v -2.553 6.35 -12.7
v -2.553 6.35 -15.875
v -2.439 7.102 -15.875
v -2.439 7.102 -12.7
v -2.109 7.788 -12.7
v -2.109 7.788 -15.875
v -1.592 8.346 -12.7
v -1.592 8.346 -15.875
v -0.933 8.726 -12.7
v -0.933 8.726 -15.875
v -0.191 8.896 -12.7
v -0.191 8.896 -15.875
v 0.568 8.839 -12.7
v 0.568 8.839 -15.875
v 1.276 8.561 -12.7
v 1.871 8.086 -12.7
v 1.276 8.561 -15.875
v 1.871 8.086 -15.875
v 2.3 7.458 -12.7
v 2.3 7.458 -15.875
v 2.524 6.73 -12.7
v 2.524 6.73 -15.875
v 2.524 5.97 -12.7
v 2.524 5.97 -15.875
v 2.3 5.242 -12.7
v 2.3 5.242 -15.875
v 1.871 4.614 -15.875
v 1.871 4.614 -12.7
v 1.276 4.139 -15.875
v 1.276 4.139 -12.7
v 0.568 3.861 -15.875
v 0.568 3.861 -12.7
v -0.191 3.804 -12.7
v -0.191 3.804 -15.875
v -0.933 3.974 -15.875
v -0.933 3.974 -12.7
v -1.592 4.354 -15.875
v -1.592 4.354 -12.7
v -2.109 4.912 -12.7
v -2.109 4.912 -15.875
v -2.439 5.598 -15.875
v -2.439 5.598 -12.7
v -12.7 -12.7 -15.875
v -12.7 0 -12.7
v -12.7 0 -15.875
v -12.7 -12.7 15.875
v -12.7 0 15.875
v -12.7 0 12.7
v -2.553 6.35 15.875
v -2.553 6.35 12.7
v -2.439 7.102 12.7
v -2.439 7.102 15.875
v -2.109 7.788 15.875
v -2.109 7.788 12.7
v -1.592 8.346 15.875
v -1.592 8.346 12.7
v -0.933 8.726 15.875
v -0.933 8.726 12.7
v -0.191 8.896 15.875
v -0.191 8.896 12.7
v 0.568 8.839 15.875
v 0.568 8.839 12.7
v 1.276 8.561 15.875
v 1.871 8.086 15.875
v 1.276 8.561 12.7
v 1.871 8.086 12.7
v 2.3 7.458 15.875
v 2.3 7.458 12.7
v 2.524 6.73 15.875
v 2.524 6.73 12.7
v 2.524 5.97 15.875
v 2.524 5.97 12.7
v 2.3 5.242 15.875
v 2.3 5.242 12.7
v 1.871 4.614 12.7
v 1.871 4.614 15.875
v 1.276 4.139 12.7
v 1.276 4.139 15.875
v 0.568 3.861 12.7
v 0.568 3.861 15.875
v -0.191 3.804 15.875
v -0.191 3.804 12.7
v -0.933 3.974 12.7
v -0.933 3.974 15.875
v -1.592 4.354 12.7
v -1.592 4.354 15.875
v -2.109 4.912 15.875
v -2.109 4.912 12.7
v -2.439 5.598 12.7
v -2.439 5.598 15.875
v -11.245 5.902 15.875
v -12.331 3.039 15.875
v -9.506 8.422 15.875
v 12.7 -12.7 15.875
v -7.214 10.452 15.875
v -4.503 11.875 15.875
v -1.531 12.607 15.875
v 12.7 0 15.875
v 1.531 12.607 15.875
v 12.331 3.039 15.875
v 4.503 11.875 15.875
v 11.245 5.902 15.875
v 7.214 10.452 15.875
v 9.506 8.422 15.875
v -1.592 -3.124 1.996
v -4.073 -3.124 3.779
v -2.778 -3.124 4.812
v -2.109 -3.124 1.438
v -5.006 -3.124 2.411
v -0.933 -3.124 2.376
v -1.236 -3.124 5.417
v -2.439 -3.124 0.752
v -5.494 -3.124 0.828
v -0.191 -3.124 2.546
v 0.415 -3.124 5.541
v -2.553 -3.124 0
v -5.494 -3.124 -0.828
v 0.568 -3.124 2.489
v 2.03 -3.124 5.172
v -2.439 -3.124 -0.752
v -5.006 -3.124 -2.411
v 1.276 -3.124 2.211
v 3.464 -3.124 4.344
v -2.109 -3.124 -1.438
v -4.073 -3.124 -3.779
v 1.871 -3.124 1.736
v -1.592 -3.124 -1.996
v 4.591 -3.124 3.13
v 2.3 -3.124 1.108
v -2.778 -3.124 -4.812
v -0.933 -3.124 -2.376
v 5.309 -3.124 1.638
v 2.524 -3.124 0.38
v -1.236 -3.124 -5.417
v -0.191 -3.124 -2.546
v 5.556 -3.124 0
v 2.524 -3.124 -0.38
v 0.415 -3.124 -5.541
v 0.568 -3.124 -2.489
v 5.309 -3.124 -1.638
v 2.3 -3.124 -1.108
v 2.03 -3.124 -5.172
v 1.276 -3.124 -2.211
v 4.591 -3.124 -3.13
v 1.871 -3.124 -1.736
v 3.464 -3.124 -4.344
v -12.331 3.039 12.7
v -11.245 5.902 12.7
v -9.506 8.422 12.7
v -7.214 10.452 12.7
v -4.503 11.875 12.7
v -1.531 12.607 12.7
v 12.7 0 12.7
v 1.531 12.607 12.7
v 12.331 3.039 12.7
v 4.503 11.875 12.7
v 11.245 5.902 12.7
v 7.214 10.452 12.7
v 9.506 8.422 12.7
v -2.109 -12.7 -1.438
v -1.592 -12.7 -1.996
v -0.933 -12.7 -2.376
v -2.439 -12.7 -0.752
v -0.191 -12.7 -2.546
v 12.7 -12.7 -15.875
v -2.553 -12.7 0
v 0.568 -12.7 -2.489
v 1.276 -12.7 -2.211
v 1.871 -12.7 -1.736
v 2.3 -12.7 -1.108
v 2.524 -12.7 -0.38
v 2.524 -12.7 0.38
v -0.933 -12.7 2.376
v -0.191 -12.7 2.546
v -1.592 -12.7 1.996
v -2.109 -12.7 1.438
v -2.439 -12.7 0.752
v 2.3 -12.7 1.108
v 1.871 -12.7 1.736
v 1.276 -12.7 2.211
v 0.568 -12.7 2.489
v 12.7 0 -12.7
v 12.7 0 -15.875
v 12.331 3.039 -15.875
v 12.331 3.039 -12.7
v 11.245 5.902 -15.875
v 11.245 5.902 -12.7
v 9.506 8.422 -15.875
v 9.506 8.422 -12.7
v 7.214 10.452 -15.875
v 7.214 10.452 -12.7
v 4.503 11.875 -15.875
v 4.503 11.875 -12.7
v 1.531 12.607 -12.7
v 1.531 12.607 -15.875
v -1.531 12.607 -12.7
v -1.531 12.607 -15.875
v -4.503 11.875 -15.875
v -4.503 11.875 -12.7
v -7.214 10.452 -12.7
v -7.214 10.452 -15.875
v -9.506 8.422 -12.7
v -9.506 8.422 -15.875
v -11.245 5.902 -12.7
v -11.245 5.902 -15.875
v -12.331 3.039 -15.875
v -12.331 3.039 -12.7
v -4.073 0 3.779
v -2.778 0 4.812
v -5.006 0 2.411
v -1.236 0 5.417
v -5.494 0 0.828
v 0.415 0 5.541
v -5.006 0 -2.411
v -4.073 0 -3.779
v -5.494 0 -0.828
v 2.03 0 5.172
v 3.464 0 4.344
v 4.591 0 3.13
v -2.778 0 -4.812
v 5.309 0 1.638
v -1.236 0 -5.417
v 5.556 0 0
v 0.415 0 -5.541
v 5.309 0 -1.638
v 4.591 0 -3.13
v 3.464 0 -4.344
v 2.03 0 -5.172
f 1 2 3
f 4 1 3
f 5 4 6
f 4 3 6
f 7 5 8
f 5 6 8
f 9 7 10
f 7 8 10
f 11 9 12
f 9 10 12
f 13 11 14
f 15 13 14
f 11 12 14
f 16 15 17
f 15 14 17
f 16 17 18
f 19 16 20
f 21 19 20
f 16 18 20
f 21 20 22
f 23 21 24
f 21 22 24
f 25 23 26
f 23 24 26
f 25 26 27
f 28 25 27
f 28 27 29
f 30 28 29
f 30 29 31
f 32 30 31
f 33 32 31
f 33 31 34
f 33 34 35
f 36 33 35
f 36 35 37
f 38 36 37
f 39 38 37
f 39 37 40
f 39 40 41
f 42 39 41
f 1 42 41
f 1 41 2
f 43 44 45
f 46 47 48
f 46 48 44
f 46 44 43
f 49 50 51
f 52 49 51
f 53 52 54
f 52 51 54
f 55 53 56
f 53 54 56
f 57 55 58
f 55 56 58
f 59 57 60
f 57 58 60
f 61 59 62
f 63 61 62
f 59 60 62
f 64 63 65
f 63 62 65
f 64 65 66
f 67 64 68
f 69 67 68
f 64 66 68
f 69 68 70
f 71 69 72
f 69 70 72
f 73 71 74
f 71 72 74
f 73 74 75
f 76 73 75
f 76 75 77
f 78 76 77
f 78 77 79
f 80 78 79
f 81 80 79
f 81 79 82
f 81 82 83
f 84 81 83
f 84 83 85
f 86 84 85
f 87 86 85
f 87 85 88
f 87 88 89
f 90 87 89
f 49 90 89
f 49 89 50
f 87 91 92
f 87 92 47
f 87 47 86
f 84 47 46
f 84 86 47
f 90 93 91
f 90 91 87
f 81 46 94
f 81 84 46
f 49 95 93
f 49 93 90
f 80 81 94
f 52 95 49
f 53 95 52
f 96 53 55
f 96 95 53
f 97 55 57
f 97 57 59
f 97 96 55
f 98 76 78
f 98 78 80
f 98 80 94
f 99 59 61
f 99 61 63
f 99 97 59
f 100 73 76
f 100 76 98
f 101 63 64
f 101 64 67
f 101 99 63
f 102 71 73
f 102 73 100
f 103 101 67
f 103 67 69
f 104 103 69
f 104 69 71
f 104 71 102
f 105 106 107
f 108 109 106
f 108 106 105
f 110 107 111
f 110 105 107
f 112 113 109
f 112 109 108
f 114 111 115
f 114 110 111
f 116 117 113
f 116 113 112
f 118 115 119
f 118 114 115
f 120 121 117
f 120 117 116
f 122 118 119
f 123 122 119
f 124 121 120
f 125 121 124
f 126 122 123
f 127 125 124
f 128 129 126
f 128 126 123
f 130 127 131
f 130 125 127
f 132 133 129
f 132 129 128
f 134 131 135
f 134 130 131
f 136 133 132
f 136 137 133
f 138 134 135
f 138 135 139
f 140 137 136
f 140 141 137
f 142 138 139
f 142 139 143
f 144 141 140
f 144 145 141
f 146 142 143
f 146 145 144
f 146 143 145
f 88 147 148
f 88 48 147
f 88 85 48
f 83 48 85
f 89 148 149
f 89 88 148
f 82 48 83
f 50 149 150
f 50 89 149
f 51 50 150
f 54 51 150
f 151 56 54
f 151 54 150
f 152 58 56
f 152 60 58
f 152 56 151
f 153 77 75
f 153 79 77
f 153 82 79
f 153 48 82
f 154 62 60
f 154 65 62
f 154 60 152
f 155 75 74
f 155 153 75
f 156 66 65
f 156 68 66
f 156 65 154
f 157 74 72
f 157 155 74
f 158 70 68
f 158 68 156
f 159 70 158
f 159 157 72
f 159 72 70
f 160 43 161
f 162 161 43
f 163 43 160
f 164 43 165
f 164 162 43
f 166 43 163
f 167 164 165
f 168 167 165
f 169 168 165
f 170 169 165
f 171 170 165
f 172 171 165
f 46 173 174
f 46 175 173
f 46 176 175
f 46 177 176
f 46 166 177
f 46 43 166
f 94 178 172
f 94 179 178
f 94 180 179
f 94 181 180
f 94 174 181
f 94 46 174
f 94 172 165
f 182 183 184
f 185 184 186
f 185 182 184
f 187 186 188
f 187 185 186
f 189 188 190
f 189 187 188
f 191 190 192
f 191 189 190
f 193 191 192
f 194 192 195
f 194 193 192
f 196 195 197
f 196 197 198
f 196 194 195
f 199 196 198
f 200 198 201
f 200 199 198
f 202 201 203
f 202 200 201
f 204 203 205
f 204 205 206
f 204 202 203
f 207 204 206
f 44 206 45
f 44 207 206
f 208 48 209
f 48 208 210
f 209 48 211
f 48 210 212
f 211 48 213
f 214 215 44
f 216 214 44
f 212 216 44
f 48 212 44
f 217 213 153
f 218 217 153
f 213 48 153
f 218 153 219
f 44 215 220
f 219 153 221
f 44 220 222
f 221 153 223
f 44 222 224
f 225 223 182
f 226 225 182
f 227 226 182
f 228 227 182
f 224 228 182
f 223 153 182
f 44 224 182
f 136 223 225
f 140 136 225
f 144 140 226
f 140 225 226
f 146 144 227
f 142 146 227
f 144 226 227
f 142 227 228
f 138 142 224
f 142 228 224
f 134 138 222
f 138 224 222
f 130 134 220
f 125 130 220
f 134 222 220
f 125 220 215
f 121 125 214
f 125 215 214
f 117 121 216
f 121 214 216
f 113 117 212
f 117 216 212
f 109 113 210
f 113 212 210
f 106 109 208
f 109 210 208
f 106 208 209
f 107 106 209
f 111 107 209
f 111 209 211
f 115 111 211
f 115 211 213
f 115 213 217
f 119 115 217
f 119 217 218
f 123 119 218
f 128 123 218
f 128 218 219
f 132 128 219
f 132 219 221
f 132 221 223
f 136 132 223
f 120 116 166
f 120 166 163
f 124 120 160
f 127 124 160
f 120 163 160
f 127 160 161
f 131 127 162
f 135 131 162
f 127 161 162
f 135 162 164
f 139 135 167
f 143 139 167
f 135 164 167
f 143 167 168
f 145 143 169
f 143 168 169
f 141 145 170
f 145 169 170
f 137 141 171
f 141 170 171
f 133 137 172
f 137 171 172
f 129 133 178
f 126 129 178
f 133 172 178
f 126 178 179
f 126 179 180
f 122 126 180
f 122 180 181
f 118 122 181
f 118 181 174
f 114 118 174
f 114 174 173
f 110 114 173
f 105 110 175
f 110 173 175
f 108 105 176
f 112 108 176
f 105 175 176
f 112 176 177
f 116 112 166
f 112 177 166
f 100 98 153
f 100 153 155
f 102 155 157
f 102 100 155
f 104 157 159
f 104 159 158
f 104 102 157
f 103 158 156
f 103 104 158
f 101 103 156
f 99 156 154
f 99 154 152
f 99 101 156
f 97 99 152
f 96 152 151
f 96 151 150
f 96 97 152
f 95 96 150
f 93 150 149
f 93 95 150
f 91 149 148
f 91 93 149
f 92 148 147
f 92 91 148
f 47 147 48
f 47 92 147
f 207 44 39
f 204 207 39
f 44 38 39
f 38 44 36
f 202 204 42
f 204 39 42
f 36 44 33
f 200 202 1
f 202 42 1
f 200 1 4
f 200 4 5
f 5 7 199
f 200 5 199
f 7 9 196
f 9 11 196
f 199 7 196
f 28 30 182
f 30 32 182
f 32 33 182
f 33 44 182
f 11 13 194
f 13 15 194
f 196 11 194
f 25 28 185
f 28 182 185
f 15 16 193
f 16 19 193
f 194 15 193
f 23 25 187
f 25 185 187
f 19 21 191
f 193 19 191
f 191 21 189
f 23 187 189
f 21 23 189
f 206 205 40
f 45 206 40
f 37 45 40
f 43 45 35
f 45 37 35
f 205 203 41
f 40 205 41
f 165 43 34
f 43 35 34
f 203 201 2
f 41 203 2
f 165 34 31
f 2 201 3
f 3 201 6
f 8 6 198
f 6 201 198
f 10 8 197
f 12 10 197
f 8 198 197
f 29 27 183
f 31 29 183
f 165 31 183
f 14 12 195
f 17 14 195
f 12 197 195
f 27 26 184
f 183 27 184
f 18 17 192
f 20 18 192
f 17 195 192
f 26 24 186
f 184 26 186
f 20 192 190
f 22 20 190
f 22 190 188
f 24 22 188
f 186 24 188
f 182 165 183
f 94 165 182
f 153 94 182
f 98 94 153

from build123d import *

# Parameters (mm, degrees)
BOSS_EXTRUDE1_DEPTH                                 = 15.875
SKETCH3_W                                           = 25.4
SKETCH3_H                                           = 12.7
CUT_EXTRUDE1_DEPTH                                  = 33.534068682
F_10_CLEARANCE_HOLE1_D                              = 5.1054
CBORE_FOR_10_BINDING_HEAD_MACHINE_SCREW_D           = 5.1054
CBORE_FOR_10_BINDING_HEAD_MACHINE_SCREW_CBORE_D     = 11.1125
CBORE_FOR_10_BINDING_HEAD_MACHINE_SCREW_CBORE_DEPTH = 3.1242


with BuildPart() as part:
    # Sketch1 → Boss-Extrude1 (new, symmetric)
    with BuildSketch(Plane.XY):
        with BuildLine():
            Line((-12.7, 0), (-12.7, -12.7))
            Line((-12.7, -12.7), (12.7, -12.7))
            Line((12.7, -12.7), (12.7, 0))
            ThreePointArc((12.7, 0), (0, 12.7), (-12.7, 0))
        make_face()
    extrude(amount=BOSS_EXTRUDE1_DEPTH, both=True)

    # Sketch3 → Cut-Extrude1 (cut, through all)
    with BuildSketch(Plane(origin=(12.7, 0, 0), x_dir=(0, 0, -1), z_dir=(1, 0, 0))):
        with Locations((0, 6.35)):
            Rectangle(SKETCH3_W, SKETCH3_H)
    extrude(amount=-CUT_EXTRUDE1_DEPTH, mode=Mode.SUBTRACT)

    # #10 Clearance Hole1 (through all)
    with Locations(Plane.XY.offset(15.875)):
        with Locations((0, 6.35)):
            Hole(F_10_CLEARANCE_HOLE1_D / 2)

    # CBORE for #10 Binding Head Machine Screw1 (through all)
    with Locations(Plane(origin=(0, 0, 0), x_dir=(1, 0, 0), z_dir=(0, 1, 0))):
        with Locations((0, 0)):
            CounterBoreHole(CBORE_FOR_10_BINDING_HEAD_MACHINE_SCREW_D / 2, CBORE_FOR_10_BINDING_HEAD_MACHINE_SCREW_CBORE_D / 2, CBORE_FOR_10_BINDING_HEAD_MACHINE_SCREW_CBORE_DEPTH)


solid = part.part
